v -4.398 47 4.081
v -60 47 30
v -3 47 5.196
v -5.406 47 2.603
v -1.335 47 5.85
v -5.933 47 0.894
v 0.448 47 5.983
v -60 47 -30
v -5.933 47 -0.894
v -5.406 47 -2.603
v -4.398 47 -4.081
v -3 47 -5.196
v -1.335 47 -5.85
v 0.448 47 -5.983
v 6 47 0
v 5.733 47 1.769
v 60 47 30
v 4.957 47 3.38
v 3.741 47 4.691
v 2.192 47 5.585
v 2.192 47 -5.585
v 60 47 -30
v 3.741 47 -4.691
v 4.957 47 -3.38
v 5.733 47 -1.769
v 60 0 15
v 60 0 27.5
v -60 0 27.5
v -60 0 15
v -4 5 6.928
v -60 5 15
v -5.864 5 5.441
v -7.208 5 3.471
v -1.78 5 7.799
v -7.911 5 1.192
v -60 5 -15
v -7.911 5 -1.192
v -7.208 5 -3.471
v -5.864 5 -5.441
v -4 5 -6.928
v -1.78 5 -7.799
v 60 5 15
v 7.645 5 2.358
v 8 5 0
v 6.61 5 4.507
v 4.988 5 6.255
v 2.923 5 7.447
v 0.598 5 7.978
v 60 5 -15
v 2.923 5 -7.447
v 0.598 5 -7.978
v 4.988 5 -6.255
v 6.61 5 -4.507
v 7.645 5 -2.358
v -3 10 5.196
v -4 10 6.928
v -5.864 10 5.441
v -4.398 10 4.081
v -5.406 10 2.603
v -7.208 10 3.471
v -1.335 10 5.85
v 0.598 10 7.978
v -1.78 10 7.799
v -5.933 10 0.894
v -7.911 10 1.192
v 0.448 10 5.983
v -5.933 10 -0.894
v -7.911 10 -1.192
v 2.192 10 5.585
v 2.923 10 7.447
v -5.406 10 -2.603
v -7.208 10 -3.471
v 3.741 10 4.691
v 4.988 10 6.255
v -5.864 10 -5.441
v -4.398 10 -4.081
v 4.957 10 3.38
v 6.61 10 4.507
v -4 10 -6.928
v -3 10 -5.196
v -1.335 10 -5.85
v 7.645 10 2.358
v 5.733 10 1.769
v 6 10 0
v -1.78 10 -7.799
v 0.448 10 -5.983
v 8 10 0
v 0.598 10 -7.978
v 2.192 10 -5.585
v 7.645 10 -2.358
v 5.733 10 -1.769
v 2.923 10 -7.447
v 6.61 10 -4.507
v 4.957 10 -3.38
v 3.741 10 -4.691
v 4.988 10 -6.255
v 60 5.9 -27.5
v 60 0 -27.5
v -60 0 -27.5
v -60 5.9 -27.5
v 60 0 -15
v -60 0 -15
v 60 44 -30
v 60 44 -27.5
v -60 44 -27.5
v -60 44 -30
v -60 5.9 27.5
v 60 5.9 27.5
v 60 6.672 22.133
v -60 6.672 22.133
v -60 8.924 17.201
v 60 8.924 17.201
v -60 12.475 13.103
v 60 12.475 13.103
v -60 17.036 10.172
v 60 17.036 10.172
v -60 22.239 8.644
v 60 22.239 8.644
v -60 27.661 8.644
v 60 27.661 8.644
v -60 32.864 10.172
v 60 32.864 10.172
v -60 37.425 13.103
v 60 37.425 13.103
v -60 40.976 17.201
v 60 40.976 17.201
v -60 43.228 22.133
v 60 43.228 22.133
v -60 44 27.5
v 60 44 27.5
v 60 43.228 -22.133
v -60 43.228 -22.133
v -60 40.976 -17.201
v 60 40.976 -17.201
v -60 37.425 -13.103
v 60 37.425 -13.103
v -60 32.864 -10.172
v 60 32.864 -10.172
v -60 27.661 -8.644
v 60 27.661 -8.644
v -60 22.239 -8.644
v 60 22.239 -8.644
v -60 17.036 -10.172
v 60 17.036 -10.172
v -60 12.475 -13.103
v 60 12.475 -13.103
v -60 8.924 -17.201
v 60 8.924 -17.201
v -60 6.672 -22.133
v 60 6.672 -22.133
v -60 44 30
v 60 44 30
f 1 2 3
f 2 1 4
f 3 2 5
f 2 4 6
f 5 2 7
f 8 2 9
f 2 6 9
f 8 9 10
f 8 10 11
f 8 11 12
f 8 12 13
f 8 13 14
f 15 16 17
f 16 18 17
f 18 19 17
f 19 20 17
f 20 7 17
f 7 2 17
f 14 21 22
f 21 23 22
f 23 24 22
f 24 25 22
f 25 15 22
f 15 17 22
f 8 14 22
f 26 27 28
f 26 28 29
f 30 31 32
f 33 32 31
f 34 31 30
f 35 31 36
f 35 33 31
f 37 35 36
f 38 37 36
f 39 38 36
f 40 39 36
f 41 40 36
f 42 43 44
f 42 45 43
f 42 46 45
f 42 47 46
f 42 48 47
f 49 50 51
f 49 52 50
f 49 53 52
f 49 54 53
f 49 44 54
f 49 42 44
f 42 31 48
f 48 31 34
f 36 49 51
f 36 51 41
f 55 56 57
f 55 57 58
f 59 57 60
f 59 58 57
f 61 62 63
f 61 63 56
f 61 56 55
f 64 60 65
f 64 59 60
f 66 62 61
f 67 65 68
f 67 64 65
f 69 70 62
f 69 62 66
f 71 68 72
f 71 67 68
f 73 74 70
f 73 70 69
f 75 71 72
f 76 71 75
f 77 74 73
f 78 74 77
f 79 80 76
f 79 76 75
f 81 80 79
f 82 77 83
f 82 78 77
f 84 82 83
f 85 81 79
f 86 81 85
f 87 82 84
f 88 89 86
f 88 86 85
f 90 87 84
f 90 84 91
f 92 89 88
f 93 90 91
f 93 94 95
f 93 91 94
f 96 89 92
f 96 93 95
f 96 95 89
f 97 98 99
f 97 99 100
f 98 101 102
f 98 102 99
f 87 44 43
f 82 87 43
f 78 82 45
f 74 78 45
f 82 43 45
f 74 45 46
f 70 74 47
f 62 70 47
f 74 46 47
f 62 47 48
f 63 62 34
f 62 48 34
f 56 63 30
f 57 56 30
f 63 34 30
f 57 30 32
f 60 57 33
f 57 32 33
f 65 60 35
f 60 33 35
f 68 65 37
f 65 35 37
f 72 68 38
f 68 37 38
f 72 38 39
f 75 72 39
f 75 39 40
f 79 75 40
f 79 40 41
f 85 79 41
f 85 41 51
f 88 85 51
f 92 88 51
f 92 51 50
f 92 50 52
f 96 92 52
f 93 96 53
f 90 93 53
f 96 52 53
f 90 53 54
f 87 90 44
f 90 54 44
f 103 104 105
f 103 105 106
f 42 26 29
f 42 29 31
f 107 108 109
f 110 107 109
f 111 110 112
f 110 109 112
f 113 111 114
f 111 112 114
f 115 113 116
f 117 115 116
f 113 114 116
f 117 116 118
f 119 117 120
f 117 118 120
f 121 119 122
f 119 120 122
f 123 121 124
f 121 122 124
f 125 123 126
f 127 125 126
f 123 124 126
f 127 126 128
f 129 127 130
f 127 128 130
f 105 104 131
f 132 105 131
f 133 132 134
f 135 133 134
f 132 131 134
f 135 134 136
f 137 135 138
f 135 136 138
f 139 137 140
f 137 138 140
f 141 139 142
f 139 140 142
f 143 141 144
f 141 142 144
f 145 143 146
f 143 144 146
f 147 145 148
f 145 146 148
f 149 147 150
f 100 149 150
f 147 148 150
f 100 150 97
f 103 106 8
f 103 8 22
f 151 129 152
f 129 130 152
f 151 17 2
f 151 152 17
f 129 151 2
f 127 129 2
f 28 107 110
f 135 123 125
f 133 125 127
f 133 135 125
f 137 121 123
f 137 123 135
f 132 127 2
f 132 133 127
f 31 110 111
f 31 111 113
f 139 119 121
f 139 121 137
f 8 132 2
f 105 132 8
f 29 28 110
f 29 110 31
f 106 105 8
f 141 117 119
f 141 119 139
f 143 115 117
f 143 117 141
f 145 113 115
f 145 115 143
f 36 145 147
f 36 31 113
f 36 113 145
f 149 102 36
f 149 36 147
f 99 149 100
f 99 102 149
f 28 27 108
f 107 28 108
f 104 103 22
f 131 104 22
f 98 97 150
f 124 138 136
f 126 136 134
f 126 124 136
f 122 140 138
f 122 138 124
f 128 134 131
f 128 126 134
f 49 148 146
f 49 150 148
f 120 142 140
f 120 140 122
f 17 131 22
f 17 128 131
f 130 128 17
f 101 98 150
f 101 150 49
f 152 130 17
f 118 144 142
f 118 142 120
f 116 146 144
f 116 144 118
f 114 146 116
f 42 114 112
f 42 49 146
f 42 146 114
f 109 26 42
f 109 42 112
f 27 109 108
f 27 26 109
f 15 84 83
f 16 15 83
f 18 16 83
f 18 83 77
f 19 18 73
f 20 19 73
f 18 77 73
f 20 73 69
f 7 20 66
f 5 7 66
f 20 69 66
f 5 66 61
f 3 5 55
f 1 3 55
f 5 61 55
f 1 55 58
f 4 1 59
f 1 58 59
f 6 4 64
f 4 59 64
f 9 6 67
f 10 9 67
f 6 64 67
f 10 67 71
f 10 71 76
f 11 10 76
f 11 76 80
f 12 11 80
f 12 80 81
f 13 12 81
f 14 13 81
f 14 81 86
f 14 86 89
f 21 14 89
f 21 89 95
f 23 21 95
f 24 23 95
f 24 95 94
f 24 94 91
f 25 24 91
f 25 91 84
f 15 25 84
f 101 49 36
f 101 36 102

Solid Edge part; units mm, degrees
sketch "Sketch1" plane through (0, 0, 0) normal (0, -1, 0) x (1, 0, 0)
  line L0 (60, -30) -> (60, 30)
  line L1 (60, 30) -> (-60, 30)
  line L2 (-60, 30) -> (-60, -30)
  line L3 (-60, -30) -> (60, -30)
extrude "Protrusion1" add sketch "Sketch1" against normal blind 47
sketch "Sketch2" plane through (60, 23.5, 0) normal (1, 0, 0) x (0, 1, 0)
  line L0 (-23.5, 30) -> (-23.5, 27.5)
  line L1 (-23.5, 27.5) -> (20.5, 27.5)
  line L2 (20.5, 27.5) -> (20.5, 30)
  line L3 (20.5, 30) -> (-23.5, 30)
extrude "ExtrudedCutout_1" cut sketch "Sketch2" against normal blind 121
sketch "Sketch3" plane through (60, 23.5, 0) normal (1, 0, 0) x (0, 1, 0)
  line L0 (-23.5, -30) -> (-23.5, -27.5)
  line L1 (-23.5, -27.5) -> (20.5, -27.5)
  line L2 (20.5, -27.5) -> (20.5, -30)
  line L3 (20.5, -30) -> (-23.5, -30)
extrude "ExtrudedCutout_2" cut sketch "Sketch3" against normal blind 121
sketch "Sketch4" plane through (60, 23.5, 0) normal (1, 0, 0) x (0, 1, 0)
  circle A0 centre (1.45, 27.5) radius 19.05
extrude "ExtrudedCutout_3" cut sketch "Sketch4" against normal blind 121
sketch "Sketch5" plane through (60, 23.5, 0) normal (1, 0, 0) x (0, 1, 0)
  circle A0 centre (1.45, -27.5) radius 19.05
extrude "ExtrudedCutout_5" cut sketch "Sketch5" against normal blind 121
sketch "Sketch6" plane through (60, 23.5, 0) normal (1, 0, 0) x (0, 0, -1)
  line L0 (-27.5, -23.5) -> (-15, -23.5)
  line L1 (-15, -23.5) -> (-15, -18.5)
  line L2 (-15, -18.5) -> (15, -18.5)
  line L3 (15, -18.5) -> (15, -23.5)
  line L4 (15, -23.5) -> (27.5, -23.5)
extrude "ExtrudedCutout_6" cut sketch "Sketch6" against normal blind 120 material side at (60, -0.05, 21.25)
sketch "Sketch7" plane through (0, 5, 0) normal (0, -1, 0) x (1, 0, 0)
  circle A0 centre (0, 0) radius 6
extrude "ExtrudedCutout_7" cut sketch "Sketch7" against normal blind 47
sketch "Sketch8" plane through (0, 5, 0) normal (0, -1, 0) x (1, 0, 0)
  circle A0 centre (0, 0) radius 8
extrude "ExtrudedCutout_8" cut sketch "Sketch8" against normal blind 5
